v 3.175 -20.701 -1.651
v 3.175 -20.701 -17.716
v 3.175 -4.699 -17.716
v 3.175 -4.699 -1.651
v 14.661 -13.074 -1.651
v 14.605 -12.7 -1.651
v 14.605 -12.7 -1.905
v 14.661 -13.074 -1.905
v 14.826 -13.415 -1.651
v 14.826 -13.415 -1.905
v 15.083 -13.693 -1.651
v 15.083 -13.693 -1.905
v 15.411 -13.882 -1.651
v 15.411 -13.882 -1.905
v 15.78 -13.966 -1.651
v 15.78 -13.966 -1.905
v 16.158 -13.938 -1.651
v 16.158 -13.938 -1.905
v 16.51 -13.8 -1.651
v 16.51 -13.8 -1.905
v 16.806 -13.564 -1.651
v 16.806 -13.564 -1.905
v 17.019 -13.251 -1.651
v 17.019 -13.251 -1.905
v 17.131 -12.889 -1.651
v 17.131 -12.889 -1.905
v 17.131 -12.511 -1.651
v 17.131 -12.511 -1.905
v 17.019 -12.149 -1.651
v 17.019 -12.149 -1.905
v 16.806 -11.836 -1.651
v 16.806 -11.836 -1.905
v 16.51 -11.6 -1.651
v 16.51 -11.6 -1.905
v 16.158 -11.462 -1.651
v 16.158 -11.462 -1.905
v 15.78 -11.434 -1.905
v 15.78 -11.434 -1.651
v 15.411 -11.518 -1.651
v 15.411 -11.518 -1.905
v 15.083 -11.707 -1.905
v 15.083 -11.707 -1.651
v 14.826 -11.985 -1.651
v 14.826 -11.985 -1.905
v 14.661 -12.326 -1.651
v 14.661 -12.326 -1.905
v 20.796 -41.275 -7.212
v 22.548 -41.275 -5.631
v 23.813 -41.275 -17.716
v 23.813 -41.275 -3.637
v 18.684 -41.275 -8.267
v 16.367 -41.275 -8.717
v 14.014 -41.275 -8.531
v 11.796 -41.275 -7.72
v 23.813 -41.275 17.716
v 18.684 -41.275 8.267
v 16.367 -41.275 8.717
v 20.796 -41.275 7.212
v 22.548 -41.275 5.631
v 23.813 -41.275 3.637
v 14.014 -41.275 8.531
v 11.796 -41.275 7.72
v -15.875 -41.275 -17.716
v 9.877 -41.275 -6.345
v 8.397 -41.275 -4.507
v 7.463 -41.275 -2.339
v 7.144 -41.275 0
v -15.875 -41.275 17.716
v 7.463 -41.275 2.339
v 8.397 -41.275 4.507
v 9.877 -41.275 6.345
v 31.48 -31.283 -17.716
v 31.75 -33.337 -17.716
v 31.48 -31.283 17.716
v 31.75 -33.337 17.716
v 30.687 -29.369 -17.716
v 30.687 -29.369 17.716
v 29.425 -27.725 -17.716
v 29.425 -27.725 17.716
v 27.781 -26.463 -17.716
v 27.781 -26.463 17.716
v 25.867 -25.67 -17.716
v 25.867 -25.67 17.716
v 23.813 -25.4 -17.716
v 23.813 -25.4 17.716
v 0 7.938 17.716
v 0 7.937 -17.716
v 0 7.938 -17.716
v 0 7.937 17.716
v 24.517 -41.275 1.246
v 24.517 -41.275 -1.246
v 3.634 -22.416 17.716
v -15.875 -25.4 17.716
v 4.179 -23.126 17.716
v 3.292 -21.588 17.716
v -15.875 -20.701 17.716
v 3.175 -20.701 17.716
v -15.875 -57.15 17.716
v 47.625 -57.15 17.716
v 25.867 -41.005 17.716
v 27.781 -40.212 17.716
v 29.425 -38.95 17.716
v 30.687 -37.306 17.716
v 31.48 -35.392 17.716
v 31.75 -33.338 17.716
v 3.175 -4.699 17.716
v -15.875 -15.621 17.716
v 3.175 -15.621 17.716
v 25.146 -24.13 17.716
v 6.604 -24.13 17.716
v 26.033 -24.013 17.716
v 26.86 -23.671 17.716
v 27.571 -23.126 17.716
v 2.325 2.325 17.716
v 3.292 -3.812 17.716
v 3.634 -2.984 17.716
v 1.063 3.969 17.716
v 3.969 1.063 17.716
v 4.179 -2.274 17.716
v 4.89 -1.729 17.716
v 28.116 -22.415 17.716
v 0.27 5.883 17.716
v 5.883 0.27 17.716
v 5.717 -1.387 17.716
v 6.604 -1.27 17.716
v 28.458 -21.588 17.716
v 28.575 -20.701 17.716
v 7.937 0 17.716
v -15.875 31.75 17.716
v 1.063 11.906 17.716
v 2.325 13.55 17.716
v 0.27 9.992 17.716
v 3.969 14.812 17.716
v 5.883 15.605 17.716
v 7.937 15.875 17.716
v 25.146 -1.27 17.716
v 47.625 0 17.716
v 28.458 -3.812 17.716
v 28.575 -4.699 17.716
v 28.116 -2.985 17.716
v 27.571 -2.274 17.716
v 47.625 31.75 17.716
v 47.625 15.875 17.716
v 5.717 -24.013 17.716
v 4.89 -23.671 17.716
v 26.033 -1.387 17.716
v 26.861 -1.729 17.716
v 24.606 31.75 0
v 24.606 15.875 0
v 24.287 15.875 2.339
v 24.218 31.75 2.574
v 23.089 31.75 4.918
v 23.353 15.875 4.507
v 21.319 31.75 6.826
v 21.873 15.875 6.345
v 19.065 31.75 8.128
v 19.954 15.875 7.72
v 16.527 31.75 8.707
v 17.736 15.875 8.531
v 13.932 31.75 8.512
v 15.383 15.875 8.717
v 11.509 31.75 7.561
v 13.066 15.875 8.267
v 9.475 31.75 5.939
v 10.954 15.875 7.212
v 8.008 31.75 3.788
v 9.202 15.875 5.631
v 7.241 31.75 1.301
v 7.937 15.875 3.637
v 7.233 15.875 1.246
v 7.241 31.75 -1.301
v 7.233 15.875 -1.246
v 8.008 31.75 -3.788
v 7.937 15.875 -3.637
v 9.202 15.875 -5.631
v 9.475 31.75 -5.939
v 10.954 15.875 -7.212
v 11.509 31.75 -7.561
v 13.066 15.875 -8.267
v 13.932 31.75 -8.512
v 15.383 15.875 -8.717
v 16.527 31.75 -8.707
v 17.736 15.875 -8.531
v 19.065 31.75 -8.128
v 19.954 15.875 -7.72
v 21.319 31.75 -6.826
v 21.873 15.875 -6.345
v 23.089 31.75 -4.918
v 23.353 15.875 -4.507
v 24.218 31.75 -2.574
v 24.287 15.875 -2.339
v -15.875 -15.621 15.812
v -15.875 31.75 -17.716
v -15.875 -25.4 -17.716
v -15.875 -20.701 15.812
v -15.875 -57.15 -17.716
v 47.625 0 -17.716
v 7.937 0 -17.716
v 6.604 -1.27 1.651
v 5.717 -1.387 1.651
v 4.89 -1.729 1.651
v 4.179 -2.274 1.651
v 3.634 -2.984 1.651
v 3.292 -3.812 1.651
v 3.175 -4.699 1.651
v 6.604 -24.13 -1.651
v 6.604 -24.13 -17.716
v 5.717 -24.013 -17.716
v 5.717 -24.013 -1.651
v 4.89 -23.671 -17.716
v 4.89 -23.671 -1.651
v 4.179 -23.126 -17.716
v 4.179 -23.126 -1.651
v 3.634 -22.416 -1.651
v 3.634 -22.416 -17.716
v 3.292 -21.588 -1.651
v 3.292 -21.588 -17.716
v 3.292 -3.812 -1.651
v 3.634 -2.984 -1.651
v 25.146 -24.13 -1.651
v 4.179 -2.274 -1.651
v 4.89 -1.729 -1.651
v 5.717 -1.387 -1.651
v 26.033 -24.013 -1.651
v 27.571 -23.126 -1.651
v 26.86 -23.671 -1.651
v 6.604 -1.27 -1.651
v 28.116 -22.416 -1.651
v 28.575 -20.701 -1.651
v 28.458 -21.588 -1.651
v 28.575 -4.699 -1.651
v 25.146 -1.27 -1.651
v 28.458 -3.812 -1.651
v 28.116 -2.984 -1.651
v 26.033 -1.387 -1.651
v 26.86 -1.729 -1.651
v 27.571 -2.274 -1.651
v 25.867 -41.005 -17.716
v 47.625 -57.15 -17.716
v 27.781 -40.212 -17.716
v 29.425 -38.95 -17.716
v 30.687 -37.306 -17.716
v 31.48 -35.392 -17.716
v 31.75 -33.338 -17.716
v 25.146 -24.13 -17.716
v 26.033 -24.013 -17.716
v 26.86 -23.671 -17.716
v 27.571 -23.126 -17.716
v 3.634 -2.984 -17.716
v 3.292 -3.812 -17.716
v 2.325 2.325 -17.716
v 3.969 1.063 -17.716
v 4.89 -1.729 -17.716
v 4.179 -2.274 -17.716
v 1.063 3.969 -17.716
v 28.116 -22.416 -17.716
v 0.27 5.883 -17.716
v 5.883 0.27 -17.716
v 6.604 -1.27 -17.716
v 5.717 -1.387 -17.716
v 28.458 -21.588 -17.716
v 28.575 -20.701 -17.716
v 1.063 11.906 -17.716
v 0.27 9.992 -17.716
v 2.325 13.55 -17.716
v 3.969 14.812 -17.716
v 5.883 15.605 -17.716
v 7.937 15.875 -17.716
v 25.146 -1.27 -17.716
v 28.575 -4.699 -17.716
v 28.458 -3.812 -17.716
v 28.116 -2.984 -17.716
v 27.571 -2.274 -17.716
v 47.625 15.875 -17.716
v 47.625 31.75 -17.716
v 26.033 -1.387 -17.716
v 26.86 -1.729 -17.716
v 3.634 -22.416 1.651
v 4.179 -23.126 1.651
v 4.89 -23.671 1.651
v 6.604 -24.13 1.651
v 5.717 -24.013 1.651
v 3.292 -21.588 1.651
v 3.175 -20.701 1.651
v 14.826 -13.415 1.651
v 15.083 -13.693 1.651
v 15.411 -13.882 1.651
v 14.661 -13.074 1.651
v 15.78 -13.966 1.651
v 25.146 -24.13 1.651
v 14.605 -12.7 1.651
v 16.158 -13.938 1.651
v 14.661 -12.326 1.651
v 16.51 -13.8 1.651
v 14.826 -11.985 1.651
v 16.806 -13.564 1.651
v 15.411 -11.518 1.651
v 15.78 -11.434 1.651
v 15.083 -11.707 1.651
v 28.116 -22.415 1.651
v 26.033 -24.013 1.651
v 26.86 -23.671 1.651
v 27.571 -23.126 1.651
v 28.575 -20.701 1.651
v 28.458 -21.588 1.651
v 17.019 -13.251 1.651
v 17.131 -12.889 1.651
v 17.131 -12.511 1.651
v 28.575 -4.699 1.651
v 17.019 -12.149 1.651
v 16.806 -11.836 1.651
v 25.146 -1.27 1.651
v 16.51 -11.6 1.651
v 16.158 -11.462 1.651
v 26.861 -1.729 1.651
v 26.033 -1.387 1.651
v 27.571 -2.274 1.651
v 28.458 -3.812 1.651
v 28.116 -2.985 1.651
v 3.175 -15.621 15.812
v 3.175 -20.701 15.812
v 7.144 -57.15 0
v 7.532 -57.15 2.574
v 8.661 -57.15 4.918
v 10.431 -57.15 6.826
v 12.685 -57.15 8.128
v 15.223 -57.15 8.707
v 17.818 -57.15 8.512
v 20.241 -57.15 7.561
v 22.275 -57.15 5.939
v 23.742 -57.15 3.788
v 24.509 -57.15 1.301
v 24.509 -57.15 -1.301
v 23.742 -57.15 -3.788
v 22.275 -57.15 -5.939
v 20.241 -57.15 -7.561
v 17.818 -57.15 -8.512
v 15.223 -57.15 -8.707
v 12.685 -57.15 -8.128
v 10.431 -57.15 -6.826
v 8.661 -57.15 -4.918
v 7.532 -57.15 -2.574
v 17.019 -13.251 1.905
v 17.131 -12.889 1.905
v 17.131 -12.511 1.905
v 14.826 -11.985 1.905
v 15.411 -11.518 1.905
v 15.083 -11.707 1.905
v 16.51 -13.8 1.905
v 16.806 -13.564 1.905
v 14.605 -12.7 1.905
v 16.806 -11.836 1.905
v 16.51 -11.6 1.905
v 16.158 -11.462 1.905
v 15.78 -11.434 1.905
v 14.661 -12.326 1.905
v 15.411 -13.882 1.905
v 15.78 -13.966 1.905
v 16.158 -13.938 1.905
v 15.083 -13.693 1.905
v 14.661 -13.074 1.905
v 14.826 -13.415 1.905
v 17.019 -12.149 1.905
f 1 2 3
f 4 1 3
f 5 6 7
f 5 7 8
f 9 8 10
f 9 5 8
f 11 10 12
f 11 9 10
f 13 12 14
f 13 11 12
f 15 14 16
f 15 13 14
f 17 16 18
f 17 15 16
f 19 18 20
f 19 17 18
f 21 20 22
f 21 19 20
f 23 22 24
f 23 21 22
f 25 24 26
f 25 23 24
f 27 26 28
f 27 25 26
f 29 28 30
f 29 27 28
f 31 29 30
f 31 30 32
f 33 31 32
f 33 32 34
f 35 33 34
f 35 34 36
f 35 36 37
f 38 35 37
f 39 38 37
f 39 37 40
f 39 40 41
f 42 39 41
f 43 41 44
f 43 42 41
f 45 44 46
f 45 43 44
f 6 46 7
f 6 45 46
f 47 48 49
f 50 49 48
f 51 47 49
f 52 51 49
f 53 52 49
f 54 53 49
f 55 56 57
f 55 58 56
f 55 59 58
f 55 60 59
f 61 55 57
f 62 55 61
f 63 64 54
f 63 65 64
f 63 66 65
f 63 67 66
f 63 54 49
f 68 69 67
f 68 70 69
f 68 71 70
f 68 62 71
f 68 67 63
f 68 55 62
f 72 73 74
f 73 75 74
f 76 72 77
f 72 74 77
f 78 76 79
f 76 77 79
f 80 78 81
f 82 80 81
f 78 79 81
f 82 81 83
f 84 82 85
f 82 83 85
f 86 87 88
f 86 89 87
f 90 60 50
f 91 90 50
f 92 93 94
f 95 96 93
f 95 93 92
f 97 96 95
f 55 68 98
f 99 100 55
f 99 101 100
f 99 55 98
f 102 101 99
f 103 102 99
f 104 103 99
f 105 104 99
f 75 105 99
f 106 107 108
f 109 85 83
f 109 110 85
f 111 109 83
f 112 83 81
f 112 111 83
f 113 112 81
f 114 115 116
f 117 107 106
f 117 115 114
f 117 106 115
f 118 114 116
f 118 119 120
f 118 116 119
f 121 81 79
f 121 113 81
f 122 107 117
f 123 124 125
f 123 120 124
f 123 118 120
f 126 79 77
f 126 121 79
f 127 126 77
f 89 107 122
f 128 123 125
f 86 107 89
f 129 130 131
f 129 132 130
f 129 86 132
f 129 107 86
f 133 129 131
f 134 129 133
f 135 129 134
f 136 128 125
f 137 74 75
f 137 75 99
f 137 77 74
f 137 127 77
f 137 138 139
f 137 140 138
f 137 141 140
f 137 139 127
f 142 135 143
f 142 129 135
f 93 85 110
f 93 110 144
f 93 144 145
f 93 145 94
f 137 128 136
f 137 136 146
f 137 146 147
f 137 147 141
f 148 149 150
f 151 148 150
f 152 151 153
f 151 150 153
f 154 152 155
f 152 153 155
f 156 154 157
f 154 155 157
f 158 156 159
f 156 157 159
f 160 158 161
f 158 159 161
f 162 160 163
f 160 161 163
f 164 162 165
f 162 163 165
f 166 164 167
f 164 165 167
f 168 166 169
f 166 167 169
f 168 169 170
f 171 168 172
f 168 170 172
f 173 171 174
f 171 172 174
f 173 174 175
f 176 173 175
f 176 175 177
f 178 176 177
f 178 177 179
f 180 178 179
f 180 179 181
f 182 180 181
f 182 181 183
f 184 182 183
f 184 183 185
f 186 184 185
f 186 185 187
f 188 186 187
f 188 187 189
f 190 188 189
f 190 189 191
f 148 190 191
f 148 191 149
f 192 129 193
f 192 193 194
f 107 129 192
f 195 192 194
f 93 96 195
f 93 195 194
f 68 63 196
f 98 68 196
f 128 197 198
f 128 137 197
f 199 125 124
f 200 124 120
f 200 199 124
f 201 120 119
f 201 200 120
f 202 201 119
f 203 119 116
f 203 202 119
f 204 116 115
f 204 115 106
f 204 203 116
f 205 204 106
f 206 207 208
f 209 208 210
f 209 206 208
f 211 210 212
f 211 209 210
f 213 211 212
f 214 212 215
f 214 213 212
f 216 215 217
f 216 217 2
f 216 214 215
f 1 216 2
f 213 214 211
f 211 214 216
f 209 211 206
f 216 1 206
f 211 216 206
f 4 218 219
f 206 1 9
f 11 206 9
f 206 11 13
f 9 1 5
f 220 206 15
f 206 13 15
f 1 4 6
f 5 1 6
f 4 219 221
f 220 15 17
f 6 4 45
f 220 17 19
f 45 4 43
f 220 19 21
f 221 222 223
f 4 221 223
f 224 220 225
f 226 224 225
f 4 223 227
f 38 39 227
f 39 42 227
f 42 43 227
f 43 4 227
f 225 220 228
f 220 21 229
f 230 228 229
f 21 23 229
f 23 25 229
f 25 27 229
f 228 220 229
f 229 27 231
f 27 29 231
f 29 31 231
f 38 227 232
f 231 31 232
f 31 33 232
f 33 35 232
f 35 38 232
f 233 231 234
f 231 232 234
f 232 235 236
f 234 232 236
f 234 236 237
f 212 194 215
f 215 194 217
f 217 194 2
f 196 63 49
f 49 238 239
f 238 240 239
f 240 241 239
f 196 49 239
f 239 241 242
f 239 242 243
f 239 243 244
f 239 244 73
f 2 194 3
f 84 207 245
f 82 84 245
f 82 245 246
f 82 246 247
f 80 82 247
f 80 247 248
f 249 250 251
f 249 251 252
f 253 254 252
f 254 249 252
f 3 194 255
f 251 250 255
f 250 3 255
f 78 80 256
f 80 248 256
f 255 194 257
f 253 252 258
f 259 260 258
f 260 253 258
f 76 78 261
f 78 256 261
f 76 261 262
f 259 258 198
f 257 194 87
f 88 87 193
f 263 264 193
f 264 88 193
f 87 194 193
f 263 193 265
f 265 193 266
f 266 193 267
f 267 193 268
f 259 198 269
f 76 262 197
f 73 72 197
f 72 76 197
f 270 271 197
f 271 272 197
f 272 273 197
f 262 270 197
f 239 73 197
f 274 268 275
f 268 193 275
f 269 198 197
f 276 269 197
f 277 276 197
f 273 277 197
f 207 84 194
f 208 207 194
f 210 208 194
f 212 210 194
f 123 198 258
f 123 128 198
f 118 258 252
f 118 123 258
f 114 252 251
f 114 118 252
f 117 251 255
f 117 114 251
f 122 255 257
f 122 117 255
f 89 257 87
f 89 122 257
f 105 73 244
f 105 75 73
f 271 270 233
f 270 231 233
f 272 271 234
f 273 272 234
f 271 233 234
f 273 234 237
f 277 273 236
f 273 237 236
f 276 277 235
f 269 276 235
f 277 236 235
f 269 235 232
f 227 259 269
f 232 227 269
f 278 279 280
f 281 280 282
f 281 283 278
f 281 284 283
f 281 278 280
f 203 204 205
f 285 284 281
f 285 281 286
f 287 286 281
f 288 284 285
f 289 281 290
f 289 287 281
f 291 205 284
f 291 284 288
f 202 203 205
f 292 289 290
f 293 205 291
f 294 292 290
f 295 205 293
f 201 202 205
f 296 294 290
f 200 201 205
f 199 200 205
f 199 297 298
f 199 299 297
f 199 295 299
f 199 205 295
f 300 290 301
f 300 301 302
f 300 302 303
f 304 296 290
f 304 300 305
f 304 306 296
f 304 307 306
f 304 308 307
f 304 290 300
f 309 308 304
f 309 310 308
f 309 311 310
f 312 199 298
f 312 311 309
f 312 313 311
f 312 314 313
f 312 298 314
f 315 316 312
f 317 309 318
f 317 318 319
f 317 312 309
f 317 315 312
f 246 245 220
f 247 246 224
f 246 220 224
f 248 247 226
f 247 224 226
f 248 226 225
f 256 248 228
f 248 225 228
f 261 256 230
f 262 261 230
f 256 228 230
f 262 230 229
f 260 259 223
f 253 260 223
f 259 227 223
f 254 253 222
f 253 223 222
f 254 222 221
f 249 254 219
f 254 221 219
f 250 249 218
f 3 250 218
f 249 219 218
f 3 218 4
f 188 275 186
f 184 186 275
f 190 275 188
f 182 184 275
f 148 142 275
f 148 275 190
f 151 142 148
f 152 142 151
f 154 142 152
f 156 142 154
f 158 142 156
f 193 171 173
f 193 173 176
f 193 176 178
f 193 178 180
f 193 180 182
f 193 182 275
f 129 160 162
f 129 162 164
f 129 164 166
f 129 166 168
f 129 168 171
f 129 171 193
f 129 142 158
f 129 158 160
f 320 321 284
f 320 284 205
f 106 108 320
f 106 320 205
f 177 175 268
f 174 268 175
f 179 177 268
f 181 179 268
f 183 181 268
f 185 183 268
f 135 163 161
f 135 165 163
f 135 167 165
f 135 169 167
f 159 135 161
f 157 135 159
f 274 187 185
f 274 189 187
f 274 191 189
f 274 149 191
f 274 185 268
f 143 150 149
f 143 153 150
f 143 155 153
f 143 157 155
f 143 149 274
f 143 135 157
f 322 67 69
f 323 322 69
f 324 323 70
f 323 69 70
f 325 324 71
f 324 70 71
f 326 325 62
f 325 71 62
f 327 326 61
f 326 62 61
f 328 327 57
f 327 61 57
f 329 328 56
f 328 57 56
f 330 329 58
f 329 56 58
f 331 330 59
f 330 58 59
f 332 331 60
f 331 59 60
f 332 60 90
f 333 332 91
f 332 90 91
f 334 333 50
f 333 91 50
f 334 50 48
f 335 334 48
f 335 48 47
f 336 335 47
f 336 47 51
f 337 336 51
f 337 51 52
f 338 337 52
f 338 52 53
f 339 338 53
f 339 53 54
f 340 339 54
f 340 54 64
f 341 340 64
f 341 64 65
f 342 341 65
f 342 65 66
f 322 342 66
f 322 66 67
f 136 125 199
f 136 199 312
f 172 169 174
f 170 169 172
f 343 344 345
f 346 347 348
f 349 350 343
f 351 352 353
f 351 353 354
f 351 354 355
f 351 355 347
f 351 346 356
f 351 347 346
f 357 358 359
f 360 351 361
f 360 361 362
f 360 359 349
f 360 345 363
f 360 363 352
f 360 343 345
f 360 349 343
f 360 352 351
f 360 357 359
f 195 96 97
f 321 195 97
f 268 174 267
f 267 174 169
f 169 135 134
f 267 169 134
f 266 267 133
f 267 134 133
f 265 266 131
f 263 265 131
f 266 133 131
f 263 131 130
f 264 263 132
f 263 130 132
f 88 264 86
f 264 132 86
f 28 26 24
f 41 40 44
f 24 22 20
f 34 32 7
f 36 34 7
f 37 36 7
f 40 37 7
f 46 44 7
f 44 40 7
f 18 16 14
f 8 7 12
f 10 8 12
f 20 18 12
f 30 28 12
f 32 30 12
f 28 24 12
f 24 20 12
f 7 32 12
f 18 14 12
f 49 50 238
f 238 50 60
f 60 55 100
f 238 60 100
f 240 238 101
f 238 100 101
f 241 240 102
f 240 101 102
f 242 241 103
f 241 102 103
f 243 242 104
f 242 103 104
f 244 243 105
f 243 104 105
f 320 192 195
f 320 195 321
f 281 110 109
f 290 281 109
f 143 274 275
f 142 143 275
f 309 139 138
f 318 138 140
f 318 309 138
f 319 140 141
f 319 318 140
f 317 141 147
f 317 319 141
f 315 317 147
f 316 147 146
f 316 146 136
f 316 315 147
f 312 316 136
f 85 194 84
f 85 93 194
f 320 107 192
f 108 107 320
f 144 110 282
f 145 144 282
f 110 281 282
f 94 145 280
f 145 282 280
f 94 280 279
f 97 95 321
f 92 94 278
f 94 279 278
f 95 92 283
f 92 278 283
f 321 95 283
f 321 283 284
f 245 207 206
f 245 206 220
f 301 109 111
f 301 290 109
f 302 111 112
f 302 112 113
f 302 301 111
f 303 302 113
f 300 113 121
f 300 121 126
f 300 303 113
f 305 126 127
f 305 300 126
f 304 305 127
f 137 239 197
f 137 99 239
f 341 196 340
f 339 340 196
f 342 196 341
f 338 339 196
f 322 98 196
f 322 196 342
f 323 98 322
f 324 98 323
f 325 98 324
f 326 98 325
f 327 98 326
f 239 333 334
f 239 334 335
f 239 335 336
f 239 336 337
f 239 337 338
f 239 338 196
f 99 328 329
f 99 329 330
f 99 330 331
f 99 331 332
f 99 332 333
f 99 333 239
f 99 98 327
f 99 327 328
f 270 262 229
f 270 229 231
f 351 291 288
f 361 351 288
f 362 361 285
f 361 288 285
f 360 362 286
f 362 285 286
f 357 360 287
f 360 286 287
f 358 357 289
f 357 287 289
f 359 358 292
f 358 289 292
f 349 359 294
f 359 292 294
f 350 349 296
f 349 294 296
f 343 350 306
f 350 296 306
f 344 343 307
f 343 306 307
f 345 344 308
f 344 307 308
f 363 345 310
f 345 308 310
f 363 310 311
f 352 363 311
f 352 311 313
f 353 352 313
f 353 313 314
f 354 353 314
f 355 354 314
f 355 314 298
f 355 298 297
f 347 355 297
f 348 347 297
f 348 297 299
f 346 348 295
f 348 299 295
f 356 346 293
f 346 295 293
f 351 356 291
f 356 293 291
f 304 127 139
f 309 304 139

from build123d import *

# Parameters (mm, degrees)
BOSS_EXTRUDE1_DEPTH         = 17.7165
FILLET1_R                   = 7.9375
F_3_4_16_TAPPED_HOLE1_D     = 17.4625
F_3_4_16_TAPPED_HOLE1_DEPTH = 15.875
F_3_4_16_TAPPED_HOLE2_D     = 17.4625
F_3_4_16_TAPPED_HOLE2_DEPTH = 15.875
SKETCH8_W                   = 25.4
SKETCH8_H                   = 22.86
CUT_EXTRUDE1_DEPTH          = 16.0655
FILLET2_R                   = 3.429
FILLET2_OF_MIRROR1_R        = 3.429
SKETCH10_R                  = 1.27
BOSS_EXTRUDE2_DEPTH         = 0.254
SKETCH15_W                  = 19.05
SKETCH15_H                  = 5.08
CUT_EXTRUDE2_DEPTH          = 1.905


with BuildPart() as part:
    # Sketch1 → Boss-Extrude1 (new, symmetric)
    with BuildSketch(Plane.XY):
        Polygon((47.625, 0), (0, 0), (0, 15.875), (47.625, 15.875), (47.625, 31.75), (-15.875, 31.75), (-15.875, -25.4), (31.75, -25.4), (31.75, -41.275), (-15.875, -41.275), (-15.875, -57.15), (47.625, -57.15), align=None)
    extrude(amount=BOSS_EXTRUDE1_DEPTH, both=True)

    # Fillet1
    fillet1_edges = [part.edges().sort_by_distance(p)[0] for p in [
        (31.75, -41.275, 0),
        (31.75, -25.4, 0),
        (0, 15.875, 0),
        (0, 0, 0),
    ]]
    fillet(fillet1_edges, radius=FILLET1_R - 0.0001)  # a hair under: the kernel refuses the full size

    # 3/4-16 Tapped Hole1
    with Locations(Plane.XZ.offset(57.15)):
        with Locations((15.875, 0)):
            Hole(F_3_4_16_TAPPED_HOLE1_D / 2, depth=F_3_4_16_TAPPED_HOLE1_DEPTH)

    # 3/4-16 Tapped Hole2
    with Locations(Plane(origin=(0, 31.75, 0), x_dir=(-1, 0, 0), z_dir=(0, 1, 0))):
        with Locations((-15.875, 0)):
            Hole(F_3_4_16_TAPPED_HOLE2_D / 2, depth=F_3_4_16_TAPPED_HOLE2_DEPTH)

    # Sketch8 → Cut-Extrude1 (cut)
    with BuildSketch(Plane.XY.offset(17.7165)):
        with Locations((15.875, -12.7)):
            Rectangle(SKETCH8_W, SKETCH8_H)
    cut_extrude1 = extrude(amount=-CUT_EXTRUDE1_DEPTH, mode=Mode.SUBTRACT)

    # Fillet2
    fillet2_edges = [part.edges().sort_by_distance(p)[0] for p in [
        (28.575, -1.27, 9.68375),
        (28.575, -24.13, 9.68375),
        (3.175, -24.13, 9.68375),
        (3.175, -1.27, 9.68375),
    ]]
    fillet(fillet2_edges, radius=FILLET2_R)

    # Mirror1: Cut-Extrude1 across plane
    add(cut_extrude1.mirror(Plane.XY), mode=Mode.SUBTRACT)

    # Fillet2 of Mirror1
    fillet2_of_mirror1_edges = [part.edges().sort_by_distance(p)[0] for p in [
        (28.575, -1.27, -9.68375),
        (28.575, -24.13, -9.68375),
        (3.175, -24.13, -9.68375),
        (3.175, -1.27, -9.68375),
    ]]
    fillet(fillet2_of_mirror1_edges, radius=FILLET2_OF_MIRROR1_R)

    # Sketch10 → Boss-Extrude2 (add)
    with BuildSketch(Plane.XY.offset(1.651)):
        with Locations(Location((15.875, -12.7, 0), (0, 0, 180))):
            Circle(SKETCH10_R)
    boss_extrude2 = extrude(amount=BOSS_EXTRUDE2_DEPTH)

    # Mirror2: Boss-Extrude2 across plane
    add(boss_extrude2.mirror(Plane.XY))

    # Sketch15 → Cut-Extrude2 (cut)
    with BuildSketch(Plane.XY.offset(17.7165)):
        with Locations((-6.35, -18.161)):
            Rectangle(SKETCH15_W, SKETCH15_H)
    extrude(amount=-CUT_EXTRUDE2_DEPTH, mode=Mode.SUBTRACT)


solid = part.part
